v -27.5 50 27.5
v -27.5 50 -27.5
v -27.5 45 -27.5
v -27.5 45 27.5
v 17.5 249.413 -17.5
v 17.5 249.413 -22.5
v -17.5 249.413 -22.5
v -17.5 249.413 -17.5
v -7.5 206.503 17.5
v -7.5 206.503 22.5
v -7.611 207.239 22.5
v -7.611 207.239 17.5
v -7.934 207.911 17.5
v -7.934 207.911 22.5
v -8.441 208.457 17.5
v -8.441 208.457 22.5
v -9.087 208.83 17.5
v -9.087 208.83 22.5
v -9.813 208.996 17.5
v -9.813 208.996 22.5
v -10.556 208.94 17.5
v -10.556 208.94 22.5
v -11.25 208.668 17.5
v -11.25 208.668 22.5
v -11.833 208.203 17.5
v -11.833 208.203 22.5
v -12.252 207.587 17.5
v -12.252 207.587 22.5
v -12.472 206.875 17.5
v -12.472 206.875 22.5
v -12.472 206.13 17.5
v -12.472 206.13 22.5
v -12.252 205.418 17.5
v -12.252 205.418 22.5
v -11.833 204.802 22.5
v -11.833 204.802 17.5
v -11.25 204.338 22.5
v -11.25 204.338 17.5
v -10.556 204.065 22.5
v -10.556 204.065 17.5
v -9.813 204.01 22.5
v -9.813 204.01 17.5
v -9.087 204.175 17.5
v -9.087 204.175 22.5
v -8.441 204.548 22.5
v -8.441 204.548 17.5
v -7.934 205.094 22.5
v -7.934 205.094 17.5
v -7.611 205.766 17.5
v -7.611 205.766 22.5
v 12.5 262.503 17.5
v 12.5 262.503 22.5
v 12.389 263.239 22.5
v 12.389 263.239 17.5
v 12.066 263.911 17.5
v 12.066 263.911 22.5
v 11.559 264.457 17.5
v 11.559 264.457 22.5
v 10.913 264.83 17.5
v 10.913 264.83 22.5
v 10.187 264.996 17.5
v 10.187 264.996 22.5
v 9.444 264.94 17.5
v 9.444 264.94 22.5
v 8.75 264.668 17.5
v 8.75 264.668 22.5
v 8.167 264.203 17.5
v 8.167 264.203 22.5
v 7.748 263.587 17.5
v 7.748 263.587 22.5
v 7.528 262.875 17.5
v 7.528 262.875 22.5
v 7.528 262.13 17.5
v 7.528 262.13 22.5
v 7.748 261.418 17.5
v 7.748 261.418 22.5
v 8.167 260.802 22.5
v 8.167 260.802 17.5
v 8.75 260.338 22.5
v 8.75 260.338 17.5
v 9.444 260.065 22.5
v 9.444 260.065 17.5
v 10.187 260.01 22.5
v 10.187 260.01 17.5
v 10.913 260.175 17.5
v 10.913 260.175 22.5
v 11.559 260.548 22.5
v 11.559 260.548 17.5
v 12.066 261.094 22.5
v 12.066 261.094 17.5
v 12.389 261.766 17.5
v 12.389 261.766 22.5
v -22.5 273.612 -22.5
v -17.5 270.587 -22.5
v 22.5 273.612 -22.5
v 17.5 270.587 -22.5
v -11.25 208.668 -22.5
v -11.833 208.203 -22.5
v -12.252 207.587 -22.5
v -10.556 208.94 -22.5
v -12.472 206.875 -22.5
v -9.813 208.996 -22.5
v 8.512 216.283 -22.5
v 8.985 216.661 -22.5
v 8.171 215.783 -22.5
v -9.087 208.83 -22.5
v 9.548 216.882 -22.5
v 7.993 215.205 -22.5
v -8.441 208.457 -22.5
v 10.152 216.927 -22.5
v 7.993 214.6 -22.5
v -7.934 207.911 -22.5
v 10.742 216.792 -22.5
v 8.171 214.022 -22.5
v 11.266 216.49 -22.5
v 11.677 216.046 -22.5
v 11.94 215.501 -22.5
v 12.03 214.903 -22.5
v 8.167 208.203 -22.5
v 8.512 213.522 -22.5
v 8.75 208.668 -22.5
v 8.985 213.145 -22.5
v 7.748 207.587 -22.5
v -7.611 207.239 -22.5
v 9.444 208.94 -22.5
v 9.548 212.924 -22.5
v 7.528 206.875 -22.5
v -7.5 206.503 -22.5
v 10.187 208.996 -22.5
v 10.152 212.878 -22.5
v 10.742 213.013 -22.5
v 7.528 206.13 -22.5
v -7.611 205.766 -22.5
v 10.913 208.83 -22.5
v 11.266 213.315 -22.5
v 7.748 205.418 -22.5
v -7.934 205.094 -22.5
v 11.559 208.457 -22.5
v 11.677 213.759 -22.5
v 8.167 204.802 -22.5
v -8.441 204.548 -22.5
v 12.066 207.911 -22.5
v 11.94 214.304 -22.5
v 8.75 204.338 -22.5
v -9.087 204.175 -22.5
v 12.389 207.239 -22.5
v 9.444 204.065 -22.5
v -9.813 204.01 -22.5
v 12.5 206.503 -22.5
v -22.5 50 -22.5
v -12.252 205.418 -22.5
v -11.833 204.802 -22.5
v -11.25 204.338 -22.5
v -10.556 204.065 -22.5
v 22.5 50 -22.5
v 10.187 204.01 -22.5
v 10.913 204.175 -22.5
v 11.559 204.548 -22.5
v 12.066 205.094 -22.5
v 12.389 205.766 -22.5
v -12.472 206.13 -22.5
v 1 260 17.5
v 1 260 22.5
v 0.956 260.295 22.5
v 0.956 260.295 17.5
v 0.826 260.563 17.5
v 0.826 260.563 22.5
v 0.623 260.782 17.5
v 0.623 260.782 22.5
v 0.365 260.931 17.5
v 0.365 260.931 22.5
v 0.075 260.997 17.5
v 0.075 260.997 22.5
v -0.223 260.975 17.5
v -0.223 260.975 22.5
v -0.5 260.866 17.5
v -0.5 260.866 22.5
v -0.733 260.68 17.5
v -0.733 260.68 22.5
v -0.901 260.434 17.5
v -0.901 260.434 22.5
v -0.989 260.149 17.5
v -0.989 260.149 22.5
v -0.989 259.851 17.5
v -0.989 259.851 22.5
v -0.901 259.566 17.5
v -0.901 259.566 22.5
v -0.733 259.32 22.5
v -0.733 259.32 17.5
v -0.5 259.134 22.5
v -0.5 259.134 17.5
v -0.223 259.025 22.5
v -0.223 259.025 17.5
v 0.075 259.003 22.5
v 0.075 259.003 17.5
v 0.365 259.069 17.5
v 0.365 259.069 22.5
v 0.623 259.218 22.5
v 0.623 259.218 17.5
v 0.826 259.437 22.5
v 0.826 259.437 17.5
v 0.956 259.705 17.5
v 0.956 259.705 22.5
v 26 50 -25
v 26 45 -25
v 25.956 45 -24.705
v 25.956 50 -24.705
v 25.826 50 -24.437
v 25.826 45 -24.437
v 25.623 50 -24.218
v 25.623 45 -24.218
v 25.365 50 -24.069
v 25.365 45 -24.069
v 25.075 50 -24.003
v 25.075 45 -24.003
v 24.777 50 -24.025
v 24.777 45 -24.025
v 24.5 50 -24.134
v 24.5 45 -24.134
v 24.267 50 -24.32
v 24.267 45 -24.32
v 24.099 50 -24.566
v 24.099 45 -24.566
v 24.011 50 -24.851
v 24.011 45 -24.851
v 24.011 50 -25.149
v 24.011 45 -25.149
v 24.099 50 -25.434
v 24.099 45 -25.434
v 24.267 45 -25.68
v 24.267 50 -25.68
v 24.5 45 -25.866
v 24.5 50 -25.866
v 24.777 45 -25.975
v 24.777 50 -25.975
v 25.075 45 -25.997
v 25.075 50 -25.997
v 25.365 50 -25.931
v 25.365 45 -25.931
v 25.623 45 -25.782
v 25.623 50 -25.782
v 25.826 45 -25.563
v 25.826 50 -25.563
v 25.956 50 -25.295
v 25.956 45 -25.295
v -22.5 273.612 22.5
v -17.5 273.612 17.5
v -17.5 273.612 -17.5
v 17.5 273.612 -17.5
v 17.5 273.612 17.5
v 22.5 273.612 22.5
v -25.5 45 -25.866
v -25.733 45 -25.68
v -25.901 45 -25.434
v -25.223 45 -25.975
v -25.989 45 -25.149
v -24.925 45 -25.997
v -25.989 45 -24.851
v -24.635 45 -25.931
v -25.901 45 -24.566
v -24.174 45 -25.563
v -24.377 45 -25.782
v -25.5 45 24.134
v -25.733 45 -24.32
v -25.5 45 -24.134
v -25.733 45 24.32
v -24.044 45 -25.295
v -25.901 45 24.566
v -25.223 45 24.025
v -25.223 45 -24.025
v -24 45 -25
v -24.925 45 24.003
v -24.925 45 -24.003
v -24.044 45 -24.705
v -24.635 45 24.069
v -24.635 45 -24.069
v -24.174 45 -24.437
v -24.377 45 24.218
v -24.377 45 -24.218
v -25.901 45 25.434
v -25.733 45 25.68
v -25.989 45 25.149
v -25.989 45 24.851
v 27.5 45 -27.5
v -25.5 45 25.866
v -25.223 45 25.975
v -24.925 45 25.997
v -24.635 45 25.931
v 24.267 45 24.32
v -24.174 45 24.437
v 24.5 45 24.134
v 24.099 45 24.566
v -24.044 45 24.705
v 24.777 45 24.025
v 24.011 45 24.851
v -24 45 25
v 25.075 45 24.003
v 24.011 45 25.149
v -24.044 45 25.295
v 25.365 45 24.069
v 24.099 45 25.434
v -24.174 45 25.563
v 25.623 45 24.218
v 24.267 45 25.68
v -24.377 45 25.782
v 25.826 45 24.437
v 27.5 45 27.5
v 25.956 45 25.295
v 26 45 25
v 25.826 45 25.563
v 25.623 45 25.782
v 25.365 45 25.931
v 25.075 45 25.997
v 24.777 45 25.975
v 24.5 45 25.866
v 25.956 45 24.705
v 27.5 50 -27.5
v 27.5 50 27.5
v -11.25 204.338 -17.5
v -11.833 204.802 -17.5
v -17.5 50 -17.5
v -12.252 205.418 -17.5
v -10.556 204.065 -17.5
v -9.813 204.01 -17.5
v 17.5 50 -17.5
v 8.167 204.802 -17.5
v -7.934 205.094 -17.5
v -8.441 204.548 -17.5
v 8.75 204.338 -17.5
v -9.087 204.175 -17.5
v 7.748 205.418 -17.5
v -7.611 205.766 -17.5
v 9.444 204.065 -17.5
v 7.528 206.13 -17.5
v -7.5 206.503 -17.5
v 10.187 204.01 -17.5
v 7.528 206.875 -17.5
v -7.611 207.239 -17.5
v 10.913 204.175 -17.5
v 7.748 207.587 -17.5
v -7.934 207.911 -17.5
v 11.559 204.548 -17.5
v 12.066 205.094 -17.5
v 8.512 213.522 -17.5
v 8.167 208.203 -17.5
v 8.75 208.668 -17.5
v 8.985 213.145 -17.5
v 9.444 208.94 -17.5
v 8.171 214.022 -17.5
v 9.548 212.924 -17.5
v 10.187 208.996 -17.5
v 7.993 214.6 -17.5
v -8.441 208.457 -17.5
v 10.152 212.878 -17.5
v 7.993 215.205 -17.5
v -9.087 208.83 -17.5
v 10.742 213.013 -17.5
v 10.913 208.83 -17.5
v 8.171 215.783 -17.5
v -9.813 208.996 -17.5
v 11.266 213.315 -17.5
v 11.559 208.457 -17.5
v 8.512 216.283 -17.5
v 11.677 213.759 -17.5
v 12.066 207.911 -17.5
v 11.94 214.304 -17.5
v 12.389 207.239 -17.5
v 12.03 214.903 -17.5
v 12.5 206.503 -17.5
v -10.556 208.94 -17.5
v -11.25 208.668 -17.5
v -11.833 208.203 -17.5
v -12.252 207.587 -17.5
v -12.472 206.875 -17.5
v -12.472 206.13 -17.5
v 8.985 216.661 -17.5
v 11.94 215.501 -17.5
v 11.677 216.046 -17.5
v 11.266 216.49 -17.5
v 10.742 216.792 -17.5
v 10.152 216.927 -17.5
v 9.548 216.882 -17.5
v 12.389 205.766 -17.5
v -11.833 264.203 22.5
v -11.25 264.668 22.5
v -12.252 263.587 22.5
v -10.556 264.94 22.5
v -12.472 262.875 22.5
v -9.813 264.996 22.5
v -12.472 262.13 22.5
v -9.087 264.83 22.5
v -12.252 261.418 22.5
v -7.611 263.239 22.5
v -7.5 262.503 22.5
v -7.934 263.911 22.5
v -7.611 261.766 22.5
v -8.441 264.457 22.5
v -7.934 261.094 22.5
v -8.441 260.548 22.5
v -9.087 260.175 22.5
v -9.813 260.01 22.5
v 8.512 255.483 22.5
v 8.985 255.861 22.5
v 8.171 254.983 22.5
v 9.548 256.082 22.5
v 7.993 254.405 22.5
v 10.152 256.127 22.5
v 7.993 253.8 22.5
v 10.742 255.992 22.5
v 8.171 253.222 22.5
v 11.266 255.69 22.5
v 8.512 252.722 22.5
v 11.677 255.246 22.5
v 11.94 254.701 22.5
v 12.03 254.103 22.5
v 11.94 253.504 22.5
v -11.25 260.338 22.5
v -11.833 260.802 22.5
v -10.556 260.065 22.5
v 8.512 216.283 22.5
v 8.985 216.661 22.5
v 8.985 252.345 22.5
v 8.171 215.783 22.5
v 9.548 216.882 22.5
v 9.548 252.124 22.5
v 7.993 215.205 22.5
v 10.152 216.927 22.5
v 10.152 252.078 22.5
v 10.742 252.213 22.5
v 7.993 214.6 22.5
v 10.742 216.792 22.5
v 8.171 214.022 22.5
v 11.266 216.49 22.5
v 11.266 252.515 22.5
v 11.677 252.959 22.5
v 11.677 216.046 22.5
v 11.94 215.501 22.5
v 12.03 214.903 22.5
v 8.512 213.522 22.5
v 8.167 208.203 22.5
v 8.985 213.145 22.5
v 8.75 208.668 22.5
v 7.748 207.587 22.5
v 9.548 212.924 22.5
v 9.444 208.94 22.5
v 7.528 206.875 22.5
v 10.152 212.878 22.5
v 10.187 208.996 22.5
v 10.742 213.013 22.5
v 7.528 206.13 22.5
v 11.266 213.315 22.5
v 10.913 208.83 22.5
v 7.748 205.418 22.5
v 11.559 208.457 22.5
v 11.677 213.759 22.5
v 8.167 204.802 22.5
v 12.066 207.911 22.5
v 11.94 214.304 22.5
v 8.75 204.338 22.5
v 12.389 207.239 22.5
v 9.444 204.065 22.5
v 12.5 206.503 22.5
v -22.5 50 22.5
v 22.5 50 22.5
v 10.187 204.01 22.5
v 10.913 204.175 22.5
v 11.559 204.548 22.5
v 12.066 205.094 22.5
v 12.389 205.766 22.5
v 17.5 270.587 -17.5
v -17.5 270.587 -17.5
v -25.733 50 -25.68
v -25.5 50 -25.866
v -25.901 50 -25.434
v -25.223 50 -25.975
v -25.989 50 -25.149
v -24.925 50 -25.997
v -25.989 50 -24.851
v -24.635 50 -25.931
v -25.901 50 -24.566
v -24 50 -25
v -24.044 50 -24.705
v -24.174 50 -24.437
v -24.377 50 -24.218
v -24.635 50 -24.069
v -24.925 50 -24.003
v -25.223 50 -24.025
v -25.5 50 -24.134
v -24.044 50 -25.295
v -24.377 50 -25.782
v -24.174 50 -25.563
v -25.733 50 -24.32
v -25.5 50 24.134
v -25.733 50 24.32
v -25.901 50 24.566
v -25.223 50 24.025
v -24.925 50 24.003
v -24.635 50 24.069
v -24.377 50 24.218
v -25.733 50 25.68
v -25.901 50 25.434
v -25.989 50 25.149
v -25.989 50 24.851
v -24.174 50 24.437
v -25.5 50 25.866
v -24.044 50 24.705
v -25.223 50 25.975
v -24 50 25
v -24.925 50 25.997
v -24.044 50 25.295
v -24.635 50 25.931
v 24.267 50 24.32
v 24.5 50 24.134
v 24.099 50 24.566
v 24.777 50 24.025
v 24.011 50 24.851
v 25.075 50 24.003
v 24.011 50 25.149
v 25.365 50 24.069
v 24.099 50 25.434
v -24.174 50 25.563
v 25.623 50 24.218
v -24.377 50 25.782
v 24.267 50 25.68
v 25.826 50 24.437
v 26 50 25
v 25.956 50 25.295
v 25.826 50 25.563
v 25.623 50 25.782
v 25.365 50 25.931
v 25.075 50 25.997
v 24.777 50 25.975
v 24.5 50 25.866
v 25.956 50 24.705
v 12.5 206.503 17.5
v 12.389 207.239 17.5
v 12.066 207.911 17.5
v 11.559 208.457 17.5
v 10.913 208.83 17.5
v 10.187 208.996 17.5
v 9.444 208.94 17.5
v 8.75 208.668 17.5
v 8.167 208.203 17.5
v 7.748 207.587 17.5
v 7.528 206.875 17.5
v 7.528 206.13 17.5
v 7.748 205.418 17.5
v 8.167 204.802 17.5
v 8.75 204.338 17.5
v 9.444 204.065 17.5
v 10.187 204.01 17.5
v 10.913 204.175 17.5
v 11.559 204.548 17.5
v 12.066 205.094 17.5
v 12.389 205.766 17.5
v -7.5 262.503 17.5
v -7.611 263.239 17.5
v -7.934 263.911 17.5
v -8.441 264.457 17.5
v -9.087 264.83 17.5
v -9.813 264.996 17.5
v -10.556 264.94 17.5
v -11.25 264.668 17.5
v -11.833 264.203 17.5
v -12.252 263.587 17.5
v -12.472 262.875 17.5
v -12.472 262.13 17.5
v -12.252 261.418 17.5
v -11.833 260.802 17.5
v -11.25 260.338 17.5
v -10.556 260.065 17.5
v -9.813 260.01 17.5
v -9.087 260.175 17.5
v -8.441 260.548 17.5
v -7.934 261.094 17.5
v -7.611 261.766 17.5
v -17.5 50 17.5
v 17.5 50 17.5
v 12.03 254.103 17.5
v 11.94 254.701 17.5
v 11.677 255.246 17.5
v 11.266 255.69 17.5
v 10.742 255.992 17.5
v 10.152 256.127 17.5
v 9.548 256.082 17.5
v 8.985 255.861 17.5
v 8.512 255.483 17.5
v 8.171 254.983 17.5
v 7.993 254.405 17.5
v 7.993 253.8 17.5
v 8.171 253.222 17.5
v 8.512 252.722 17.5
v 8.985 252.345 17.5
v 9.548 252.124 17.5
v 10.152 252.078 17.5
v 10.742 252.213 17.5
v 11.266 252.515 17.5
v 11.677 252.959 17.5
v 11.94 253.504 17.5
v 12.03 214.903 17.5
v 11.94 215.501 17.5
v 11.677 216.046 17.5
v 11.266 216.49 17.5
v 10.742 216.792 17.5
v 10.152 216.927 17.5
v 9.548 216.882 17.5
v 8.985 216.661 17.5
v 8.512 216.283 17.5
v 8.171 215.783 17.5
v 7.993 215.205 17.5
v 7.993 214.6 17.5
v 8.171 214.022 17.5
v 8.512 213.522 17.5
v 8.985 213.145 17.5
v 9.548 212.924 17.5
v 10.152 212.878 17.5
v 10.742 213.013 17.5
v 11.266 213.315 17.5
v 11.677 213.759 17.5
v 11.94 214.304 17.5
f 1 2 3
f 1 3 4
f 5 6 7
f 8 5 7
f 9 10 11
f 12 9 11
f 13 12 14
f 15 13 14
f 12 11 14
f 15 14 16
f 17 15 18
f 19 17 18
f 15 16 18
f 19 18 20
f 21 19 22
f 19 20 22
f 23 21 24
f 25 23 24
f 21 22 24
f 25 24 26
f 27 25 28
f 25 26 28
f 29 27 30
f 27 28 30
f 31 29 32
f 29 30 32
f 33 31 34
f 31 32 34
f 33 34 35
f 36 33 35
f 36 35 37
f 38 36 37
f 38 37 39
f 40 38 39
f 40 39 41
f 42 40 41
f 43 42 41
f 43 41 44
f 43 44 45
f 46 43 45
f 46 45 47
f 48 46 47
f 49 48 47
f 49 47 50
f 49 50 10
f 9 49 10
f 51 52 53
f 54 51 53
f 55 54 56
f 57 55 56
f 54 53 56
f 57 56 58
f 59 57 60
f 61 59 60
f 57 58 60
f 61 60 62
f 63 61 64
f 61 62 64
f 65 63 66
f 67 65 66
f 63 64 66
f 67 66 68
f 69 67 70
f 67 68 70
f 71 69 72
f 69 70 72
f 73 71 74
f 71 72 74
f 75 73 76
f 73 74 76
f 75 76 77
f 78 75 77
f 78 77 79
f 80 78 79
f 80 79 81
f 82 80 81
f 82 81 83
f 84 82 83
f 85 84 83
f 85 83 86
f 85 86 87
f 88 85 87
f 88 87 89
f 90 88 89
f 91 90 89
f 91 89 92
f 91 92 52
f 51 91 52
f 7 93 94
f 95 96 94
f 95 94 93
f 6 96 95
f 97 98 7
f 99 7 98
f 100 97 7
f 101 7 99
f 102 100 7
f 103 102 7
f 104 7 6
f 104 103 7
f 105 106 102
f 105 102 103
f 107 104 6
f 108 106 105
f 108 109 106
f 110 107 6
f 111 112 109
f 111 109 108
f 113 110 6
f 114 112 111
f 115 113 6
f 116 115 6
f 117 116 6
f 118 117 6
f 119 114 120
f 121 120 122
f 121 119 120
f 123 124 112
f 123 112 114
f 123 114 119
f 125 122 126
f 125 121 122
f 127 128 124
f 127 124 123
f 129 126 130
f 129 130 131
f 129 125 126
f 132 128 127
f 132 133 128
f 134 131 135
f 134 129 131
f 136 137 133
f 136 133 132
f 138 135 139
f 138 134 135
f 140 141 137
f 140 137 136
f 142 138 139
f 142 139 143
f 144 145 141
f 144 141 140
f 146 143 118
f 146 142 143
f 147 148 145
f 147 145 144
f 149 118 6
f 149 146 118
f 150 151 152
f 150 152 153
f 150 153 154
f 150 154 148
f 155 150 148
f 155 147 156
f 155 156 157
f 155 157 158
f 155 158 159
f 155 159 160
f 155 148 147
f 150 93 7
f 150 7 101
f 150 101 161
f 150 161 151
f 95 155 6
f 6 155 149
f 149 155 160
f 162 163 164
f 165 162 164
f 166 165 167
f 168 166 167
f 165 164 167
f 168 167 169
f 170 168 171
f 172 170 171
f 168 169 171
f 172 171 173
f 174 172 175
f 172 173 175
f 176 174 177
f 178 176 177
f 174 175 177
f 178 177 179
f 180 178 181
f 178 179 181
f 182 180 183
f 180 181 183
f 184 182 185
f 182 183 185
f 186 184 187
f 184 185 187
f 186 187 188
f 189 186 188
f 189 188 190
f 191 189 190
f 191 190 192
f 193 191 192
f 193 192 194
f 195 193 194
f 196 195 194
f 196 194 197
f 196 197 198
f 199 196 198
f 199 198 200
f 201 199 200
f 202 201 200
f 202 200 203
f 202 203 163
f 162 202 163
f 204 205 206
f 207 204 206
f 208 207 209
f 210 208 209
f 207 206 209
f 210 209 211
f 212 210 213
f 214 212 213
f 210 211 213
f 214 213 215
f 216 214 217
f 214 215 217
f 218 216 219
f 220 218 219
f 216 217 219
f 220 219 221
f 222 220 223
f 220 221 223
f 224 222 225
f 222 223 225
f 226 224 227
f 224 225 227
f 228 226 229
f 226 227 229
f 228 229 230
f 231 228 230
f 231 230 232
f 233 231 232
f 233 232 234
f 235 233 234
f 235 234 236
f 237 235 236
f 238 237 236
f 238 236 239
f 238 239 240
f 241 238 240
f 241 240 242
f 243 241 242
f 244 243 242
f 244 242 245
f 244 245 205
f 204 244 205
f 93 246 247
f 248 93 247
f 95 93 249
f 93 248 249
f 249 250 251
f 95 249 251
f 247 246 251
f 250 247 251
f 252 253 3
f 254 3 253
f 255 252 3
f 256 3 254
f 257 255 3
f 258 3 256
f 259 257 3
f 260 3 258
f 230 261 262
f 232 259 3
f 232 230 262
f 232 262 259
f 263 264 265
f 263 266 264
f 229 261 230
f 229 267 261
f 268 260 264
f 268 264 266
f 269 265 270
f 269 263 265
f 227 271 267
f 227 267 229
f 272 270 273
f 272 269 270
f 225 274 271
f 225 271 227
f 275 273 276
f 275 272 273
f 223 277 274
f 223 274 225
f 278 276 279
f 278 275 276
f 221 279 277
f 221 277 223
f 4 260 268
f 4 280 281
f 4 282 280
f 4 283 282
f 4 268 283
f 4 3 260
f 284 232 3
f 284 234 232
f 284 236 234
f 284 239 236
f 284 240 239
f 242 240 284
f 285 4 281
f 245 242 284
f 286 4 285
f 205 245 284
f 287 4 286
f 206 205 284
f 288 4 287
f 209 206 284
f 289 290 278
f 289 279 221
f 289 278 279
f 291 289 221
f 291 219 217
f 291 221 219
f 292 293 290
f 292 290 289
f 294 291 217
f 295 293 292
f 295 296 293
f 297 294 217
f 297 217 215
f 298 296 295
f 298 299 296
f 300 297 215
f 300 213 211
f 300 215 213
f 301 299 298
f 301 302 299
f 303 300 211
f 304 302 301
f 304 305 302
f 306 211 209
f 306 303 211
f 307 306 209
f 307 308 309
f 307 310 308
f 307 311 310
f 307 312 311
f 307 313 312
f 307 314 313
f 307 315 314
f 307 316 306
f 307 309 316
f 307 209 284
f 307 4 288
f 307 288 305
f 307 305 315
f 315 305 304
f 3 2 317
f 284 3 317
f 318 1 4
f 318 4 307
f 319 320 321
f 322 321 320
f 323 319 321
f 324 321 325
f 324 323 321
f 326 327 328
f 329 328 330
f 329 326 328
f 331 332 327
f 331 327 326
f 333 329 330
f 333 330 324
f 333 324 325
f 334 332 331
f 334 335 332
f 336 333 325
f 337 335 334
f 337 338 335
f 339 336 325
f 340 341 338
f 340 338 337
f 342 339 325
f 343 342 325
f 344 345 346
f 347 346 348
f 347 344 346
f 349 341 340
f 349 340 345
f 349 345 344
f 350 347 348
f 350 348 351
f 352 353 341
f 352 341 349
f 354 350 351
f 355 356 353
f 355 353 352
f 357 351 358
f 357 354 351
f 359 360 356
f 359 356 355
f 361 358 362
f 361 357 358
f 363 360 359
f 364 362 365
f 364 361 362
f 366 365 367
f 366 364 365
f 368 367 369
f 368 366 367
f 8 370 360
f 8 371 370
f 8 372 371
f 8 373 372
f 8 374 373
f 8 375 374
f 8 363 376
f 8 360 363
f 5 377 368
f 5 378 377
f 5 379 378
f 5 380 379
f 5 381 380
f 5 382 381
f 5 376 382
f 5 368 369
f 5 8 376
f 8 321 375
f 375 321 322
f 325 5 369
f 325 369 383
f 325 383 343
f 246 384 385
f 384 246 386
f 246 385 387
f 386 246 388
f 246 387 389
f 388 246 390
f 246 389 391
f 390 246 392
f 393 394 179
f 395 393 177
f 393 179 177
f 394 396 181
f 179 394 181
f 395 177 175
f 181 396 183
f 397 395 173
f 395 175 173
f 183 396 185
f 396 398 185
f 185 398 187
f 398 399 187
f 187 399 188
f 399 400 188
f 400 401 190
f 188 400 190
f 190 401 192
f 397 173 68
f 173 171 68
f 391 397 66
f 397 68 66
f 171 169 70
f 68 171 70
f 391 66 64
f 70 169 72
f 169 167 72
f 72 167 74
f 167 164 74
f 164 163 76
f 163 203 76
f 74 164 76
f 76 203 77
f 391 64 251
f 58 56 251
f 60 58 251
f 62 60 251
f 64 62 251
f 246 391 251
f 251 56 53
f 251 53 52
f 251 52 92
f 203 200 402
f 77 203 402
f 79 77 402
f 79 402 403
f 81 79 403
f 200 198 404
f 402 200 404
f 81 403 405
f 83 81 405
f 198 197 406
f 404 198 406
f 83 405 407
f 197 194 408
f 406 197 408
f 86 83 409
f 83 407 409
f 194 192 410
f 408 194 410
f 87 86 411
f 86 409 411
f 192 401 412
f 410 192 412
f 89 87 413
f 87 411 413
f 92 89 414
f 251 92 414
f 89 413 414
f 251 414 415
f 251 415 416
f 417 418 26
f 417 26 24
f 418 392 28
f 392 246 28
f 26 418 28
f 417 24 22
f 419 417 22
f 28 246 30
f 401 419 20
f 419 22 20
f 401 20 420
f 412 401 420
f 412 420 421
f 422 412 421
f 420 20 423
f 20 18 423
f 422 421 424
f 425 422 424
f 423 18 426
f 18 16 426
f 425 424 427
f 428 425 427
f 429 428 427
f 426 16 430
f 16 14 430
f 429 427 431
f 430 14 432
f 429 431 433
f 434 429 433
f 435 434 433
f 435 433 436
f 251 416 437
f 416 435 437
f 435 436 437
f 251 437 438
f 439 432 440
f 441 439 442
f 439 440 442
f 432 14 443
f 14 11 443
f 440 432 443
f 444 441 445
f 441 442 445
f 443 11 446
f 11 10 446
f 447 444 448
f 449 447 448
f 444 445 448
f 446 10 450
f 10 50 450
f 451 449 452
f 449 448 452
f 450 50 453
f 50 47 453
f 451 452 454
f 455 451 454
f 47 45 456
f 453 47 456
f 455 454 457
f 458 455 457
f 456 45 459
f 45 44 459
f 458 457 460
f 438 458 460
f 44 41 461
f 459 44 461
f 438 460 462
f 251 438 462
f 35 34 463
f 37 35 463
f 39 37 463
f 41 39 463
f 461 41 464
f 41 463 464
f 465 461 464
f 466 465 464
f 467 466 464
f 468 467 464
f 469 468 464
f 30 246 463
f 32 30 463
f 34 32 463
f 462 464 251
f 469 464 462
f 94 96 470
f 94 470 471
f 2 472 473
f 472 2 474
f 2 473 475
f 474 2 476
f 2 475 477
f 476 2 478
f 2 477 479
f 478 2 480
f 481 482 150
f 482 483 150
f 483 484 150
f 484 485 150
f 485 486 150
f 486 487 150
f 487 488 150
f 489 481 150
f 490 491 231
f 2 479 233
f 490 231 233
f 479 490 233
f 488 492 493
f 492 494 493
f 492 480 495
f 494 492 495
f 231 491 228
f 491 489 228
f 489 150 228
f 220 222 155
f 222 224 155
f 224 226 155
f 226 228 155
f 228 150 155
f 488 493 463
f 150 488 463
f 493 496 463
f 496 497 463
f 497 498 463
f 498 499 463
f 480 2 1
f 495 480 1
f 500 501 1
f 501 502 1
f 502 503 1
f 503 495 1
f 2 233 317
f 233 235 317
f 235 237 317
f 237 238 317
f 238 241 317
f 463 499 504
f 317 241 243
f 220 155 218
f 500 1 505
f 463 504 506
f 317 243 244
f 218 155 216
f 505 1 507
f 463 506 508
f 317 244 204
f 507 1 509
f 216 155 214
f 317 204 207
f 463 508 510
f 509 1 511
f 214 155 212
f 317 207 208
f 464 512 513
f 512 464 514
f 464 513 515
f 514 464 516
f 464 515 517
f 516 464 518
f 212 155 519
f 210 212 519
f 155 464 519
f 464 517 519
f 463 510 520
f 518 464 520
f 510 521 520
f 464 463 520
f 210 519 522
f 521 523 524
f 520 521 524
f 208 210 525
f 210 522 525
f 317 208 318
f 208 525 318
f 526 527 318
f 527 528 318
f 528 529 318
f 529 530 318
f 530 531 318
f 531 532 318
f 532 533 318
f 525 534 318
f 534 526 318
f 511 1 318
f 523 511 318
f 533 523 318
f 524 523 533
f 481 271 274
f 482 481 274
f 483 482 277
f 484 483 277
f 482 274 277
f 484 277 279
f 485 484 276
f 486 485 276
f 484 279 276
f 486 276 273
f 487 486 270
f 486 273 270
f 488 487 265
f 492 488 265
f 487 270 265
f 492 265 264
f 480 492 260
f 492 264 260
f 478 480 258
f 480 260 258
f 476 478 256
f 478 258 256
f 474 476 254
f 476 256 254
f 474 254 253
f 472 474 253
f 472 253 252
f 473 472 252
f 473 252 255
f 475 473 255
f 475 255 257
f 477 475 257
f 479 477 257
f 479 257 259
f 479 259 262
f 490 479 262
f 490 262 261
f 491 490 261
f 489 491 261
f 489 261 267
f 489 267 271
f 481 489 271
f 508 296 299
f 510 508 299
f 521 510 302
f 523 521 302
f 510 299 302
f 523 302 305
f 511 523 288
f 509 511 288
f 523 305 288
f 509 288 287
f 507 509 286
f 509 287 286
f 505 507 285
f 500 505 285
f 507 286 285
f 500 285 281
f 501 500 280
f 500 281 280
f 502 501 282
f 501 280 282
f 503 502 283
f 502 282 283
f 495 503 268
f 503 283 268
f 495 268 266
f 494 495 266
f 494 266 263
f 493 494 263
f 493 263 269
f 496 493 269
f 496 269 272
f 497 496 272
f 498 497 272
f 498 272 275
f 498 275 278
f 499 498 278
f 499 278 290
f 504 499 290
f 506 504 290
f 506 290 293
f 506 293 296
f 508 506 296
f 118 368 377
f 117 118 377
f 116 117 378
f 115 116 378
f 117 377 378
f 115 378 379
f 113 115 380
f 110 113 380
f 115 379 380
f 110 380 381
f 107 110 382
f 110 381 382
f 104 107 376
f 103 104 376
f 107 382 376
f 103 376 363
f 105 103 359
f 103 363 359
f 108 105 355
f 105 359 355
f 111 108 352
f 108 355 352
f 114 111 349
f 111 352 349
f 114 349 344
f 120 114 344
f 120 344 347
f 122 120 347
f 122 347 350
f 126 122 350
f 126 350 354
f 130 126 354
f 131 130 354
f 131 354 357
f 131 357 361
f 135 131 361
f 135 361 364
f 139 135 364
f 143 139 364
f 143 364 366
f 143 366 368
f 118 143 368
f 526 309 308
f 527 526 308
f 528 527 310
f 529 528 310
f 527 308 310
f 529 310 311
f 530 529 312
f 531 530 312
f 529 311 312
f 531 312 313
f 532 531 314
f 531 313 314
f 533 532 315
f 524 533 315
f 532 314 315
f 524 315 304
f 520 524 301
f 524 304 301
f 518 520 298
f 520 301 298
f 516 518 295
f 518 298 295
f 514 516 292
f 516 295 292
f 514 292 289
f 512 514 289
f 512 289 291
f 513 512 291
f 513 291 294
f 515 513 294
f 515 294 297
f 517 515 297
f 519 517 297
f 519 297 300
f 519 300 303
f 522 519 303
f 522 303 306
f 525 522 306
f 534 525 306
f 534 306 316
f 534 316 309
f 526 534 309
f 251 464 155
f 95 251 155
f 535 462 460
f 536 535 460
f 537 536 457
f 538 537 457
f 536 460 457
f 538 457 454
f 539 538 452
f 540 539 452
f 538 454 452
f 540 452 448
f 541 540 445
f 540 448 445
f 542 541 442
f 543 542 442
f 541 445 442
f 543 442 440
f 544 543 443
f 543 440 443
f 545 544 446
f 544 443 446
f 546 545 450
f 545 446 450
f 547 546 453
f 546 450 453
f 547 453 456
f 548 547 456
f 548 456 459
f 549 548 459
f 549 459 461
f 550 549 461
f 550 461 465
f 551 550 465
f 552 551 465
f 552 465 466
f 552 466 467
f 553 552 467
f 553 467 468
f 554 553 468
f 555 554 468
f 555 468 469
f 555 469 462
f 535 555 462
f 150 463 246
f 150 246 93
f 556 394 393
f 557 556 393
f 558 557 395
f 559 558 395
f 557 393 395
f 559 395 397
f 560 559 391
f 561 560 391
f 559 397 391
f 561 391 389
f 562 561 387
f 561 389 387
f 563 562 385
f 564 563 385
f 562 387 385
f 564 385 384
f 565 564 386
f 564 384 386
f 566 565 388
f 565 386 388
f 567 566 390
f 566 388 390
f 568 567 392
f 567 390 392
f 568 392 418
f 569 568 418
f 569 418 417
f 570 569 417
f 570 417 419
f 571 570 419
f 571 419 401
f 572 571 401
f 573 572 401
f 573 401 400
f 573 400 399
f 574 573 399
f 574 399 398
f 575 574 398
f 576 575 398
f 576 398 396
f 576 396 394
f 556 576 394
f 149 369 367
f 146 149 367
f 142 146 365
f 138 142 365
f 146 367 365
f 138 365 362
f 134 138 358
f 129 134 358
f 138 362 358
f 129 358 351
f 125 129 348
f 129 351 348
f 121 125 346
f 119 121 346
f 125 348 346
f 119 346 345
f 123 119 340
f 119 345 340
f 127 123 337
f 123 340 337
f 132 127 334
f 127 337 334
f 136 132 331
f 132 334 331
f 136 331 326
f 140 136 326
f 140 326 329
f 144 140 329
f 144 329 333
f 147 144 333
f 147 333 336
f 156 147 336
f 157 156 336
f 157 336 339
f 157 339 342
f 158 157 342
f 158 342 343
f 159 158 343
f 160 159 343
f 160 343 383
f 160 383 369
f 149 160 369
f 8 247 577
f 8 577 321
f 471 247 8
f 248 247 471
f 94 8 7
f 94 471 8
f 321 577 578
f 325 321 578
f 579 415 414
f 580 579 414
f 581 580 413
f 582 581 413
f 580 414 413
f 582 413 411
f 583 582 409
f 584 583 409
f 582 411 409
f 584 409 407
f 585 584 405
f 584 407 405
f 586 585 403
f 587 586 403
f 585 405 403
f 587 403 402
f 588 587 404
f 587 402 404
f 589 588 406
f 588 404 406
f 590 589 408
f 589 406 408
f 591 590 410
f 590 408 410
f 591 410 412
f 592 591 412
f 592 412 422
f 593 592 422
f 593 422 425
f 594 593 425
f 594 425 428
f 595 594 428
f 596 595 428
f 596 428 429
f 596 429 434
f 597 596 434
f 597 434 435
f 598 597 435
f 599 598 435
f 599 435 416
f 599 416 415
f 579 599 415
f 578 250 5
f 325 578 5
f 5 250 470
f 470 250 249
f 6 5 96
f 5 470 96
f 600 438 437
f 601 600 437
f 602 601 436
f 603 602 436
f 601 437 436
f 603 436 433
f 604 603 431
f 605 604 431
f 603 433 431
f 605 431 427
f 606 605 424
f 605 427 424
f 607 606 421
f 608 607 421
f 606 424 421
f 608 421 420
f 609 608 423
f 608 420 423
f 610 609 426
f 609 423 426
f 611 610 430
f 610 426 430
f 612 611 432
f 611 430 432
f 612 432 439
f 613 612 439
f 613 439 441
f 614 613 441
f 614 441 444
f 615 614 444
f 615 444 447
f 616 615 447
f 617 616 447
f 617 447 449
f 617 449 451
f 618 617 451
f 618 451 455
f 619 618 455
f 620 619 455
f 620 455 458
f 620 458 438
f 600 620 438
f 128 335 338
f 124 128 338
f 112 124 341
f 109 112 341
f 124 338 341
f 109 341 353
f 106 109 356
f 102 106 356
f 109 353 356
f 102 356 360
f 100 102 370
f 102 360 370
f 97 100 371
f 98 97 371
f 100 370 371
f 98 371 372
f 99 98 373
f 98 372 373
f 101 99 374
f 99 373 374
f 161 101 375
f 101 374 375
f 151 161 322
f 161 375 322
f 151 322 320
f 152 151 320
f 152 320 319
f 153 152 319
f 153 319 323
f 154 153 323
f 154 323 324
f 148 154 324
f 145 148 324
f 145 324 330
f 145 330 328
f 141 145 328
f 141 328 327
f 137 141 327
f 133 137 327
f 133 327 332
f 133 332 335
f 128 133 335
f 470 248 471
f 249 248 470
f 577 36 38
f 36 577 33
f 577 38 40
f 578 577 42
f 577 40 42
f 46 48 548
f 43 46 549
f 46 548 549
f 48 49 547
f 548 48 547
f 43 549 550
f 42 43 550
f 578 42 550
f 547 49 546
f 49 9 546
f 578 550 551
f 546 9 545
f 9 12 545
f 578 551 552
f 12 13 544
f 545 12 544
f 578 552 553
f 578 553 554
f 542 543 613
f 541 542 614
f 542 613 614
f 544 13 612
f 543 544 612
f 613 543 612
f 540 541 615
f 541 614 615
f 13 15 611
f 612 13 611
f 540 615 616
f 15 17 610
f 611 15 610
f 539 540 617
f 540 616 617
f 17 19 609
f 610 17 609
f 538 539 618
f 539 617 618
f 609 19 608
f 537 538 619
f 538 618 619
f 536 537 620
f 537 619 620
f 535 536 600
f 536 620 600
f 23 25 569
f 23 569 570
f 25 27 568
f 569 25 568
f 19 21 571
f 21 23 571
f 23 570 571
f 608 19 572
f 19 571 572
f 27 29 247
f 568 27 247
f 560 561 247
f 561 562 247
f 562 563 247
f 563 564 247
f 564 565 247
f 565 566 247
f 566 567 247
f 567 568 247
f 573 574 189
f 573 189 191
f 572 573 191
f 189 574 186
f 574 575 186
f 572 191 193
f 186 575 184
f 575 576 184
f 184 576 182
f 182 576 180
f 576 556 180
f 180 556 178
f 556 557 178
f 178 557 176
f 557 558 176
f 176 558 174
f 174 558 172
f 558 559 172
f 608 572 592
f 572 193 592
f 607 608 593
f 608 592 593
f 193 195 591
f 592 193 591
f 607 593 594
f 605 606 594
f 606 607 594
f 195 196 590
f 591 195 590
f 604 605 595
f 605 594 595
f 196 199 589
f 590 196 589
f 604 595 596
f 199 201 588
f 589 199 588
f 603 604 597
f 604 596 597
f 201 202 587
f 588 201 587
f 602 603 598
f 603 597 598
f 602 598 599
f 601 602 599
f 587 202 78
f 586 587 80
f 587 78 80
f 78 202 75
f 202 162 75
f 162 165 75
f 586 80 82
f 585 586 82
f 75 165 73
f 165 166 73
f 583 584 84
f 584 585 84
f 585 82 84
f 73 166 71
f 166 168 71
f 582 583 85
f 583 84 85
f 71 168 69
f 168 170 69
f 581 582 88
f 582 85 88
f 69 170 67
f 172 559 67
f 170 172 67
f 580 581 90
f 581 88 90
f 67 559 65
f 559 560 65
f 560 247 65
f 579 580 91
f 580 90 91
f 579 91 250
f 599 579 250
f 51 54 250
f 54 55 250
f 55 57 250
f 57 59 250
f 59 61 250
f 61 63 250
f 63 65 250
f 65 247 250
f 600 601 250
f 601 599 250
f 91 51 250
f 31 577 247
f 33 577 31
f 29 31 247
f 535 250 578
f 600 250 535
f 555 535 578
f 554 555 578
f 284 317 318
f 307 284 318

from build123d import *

# Parameters (mm, degrees)
CROQUIS1_W                 = 45
CROQUIS1_H                 = 45
SALIENTE_EXTRUIR1_DEPTH    = 300
CROQUIS4_W                 = 18
CROQUIS4_H                 = 34
CORTAR_EXTRUIR2_DEPTH      = 46
CROQUIS8_W                 = 35
CROQUIS8_H                 = 35
CORTAR_EXTRUIR3_DEPTH      = 301
CROQUIS9_W                 = 35
CROQUIS9_H                 = 21.174410022
CORTAR_EXTRUIR4_DEPTH      = 10
CROQUIS10_R                = 1
CORTAR_EXTRUIR5_DEPTH      = 10
CROQUIS11_W                = 45
CROQUIS11_H                = 26.387879272
CORTAR_EXTRUIR6_DEPTH      = 46
CROQUIS13_W                = 45
CROQUIS13_H                = 50
CORTAR_EXTRUIR7_DEPTH      = 23.5
CORTAR_EXTRUIR7_DEPTH_BACK = 23.5
CROQUIS14_W                = 55
CROQUIS14_H                = 55
SALIENTE_EXTRUIR2_DEPTH    = 5
CROQUIS16_R                = 1
CORTAR_EXTRUIR8_DEPTH      = 1
CORTAR_EXTRUIR8_DEPTH_BACK = 229.612120728
CROQUIS17_R                = 2.5
CROQUIS17_R_2              = 2.03
CORTAR_EXTRUIR9_DEPTH      = 6
CORTAR_EXTRUIR9_DEPTH_BACK = 51


with BuildPart() as part:
    # Croquis1 → Saliente-Extruir1 (new body)
    with BuildSketch(Plane(origin=(0, 0, 0), x_dir=(1, 0, 0), z_dir=(0, 1, 0))):
        Rectangle(CROQUIS1_W, CROQUIS1_H)
    extrude(amount=SALIENTE_EXTRUIR1_DEPTH)

    # Croquis4 → Cortar-Extruir2 (cut, through all)
    with BuildSketch(Plane.ZY.offset(22.5)):
        with Locations((13.5, 17)):
            Rectangle(CROQUIS4_W, CROQUIS4_H)
    extrude(amount=-CORTAR_EXTRUIR2_DEPTH, mode=Mode.SUBTRACT)

    # Croquis8 → Cortar-Extruir3 (cut, through all)
    with BuildSketch(Plane(origin=(0, 300, 0), x_dir=(1, 0, 0), z_dir=(0, 1, 0))):
        Rectangle(CROQUIS8_W, CROQUIS8_H)
    extrude(amount=-CORTAR_EXTRUIR3_DEPTH, mode=Mode.SUBTRACT)

    # Croquis9 → Cortar-Extruir4 (cut)
    with BuildSketch(Plane(origin=(0, 0, -22.5), x_dir=(-1, 0, 0), z_dir=(0, 0, -1))):
        with Locations((0, 260)):
            Rectangle(CROQUIS9_W, CROQUIS9_H)
    extrude(amount=-CORTAR_EXTRUIR4_DEPTH, mode=Mode.SUBTRACT)

    # Croquis10 → Cortar-Extruir5 (cut)
    with BuildSketch(Plane.XY.offset(22.5)):
        with Locations((0, 260)):
            Circle(CROQUIS10_R)
    extrude(amount=-CORTAR_EXTRUIR5_DEPTH, mode=Mode.SUBTRACT)

    # Croquis11 → Cortar-Extruir6 (cut, through all)
    with BuildSketch(Plane.XY.offset(22.5)):
        with Locations((0, 286.806060364)):
            Rectangle(CROQUIS11_W, CROQUIS11_H)
    extrude(amount=-CORTAR_EXTRUIR6_DEPTH, mode=Mode.SUBTRACT)

    # Croquis13 → Cortar-Extruir7 (cut, two sides)
    with BuildSketch(Plane(origin=(0, 0, 0), x_dir=(0, 0, -1), z_dir=(1, 0, 0))) as cortar_extruir7_sk:
        with Locations((0, 25)):
            Rectangle(CROQUIS13_W, CROQUIS13_H)
    extrude(amount=CORTAR_EXTRUIR7_DEPTH, mode=Mode.SUBTRACT)
    extrude(cortar_extruir7_sk.sketch, amount=-CORTAR_EXTRUIR7_DEPTH_BACK, mode=Mode.SUBTRACT)

    # Croquis14 → Saliente-Extruir2 (add)
    with BuildSketch(Plane.XZ.offset(-50)):
        Rectangle(CROQUIS14_W, CROQUIS14_H)
    extrude(amount=SALIENTE_EXTRUIR2_DEPTH)

    # Croquis16 → Cortar-Extruir8 (cut, two sides)
    with BuildSketch(Plane.XZ.offset(-45)) as cortar_extruir8_sk:
        with Locations((25, 25)):
            Circle(CROQUIS16_R)
        with Locations((-25, 25)):
            Circle(CROQUIS16_R)
        with Locations((-25, -25)):
            Circle(CROQUIS16_R)
        with Locations((25, -25)):
            Circle(CROQUIS16_R)
    extrude(amount=CORTAR_EXTRUIR8_DEPTH, mode=Mode.SUBTRACT)
    extrude(cortar_extruir8_sk.sketch, amount=-CORTAR_EXTRUIR8_DEPTH_BACK, mode=Mode.SUBTRACT)

    # Croquis17 → Cortar-Extruir9 (cut, two sides)
    with BuildSketch(Plane.XY.offset(22.5)) as cortar_extruir9_sk:
        with Locations((-10, 262.50260741)):
            Circle(CROQUIS17_R)
        with Locations((-10, 206.50260741)):
            Circle(CROQUIS17_R)
        with Locations((10, 262.50260741)):
            Circle(CROQUIS17_R)
        with Locations((10, 206.50260741)):
            Circle(CROQUIS17_R)
        with Locations((10, 254.10260741)):
            Circle(CROQUIS17_R_2)
        with Locations((10, 214.90260741)):
            Circle(CROQUIS17_R_2)
    extrude(amount=CORTAR_EXTRUIR9_DEPTH, mode=Mode.SUBTRACT)
    extrude(cortar_extruir9_sk.sketch, amount=-CORTAR_EXTRUIR9_DEPTH_BACK, mode=Mode.SUBTRACT)


solid = part.part
